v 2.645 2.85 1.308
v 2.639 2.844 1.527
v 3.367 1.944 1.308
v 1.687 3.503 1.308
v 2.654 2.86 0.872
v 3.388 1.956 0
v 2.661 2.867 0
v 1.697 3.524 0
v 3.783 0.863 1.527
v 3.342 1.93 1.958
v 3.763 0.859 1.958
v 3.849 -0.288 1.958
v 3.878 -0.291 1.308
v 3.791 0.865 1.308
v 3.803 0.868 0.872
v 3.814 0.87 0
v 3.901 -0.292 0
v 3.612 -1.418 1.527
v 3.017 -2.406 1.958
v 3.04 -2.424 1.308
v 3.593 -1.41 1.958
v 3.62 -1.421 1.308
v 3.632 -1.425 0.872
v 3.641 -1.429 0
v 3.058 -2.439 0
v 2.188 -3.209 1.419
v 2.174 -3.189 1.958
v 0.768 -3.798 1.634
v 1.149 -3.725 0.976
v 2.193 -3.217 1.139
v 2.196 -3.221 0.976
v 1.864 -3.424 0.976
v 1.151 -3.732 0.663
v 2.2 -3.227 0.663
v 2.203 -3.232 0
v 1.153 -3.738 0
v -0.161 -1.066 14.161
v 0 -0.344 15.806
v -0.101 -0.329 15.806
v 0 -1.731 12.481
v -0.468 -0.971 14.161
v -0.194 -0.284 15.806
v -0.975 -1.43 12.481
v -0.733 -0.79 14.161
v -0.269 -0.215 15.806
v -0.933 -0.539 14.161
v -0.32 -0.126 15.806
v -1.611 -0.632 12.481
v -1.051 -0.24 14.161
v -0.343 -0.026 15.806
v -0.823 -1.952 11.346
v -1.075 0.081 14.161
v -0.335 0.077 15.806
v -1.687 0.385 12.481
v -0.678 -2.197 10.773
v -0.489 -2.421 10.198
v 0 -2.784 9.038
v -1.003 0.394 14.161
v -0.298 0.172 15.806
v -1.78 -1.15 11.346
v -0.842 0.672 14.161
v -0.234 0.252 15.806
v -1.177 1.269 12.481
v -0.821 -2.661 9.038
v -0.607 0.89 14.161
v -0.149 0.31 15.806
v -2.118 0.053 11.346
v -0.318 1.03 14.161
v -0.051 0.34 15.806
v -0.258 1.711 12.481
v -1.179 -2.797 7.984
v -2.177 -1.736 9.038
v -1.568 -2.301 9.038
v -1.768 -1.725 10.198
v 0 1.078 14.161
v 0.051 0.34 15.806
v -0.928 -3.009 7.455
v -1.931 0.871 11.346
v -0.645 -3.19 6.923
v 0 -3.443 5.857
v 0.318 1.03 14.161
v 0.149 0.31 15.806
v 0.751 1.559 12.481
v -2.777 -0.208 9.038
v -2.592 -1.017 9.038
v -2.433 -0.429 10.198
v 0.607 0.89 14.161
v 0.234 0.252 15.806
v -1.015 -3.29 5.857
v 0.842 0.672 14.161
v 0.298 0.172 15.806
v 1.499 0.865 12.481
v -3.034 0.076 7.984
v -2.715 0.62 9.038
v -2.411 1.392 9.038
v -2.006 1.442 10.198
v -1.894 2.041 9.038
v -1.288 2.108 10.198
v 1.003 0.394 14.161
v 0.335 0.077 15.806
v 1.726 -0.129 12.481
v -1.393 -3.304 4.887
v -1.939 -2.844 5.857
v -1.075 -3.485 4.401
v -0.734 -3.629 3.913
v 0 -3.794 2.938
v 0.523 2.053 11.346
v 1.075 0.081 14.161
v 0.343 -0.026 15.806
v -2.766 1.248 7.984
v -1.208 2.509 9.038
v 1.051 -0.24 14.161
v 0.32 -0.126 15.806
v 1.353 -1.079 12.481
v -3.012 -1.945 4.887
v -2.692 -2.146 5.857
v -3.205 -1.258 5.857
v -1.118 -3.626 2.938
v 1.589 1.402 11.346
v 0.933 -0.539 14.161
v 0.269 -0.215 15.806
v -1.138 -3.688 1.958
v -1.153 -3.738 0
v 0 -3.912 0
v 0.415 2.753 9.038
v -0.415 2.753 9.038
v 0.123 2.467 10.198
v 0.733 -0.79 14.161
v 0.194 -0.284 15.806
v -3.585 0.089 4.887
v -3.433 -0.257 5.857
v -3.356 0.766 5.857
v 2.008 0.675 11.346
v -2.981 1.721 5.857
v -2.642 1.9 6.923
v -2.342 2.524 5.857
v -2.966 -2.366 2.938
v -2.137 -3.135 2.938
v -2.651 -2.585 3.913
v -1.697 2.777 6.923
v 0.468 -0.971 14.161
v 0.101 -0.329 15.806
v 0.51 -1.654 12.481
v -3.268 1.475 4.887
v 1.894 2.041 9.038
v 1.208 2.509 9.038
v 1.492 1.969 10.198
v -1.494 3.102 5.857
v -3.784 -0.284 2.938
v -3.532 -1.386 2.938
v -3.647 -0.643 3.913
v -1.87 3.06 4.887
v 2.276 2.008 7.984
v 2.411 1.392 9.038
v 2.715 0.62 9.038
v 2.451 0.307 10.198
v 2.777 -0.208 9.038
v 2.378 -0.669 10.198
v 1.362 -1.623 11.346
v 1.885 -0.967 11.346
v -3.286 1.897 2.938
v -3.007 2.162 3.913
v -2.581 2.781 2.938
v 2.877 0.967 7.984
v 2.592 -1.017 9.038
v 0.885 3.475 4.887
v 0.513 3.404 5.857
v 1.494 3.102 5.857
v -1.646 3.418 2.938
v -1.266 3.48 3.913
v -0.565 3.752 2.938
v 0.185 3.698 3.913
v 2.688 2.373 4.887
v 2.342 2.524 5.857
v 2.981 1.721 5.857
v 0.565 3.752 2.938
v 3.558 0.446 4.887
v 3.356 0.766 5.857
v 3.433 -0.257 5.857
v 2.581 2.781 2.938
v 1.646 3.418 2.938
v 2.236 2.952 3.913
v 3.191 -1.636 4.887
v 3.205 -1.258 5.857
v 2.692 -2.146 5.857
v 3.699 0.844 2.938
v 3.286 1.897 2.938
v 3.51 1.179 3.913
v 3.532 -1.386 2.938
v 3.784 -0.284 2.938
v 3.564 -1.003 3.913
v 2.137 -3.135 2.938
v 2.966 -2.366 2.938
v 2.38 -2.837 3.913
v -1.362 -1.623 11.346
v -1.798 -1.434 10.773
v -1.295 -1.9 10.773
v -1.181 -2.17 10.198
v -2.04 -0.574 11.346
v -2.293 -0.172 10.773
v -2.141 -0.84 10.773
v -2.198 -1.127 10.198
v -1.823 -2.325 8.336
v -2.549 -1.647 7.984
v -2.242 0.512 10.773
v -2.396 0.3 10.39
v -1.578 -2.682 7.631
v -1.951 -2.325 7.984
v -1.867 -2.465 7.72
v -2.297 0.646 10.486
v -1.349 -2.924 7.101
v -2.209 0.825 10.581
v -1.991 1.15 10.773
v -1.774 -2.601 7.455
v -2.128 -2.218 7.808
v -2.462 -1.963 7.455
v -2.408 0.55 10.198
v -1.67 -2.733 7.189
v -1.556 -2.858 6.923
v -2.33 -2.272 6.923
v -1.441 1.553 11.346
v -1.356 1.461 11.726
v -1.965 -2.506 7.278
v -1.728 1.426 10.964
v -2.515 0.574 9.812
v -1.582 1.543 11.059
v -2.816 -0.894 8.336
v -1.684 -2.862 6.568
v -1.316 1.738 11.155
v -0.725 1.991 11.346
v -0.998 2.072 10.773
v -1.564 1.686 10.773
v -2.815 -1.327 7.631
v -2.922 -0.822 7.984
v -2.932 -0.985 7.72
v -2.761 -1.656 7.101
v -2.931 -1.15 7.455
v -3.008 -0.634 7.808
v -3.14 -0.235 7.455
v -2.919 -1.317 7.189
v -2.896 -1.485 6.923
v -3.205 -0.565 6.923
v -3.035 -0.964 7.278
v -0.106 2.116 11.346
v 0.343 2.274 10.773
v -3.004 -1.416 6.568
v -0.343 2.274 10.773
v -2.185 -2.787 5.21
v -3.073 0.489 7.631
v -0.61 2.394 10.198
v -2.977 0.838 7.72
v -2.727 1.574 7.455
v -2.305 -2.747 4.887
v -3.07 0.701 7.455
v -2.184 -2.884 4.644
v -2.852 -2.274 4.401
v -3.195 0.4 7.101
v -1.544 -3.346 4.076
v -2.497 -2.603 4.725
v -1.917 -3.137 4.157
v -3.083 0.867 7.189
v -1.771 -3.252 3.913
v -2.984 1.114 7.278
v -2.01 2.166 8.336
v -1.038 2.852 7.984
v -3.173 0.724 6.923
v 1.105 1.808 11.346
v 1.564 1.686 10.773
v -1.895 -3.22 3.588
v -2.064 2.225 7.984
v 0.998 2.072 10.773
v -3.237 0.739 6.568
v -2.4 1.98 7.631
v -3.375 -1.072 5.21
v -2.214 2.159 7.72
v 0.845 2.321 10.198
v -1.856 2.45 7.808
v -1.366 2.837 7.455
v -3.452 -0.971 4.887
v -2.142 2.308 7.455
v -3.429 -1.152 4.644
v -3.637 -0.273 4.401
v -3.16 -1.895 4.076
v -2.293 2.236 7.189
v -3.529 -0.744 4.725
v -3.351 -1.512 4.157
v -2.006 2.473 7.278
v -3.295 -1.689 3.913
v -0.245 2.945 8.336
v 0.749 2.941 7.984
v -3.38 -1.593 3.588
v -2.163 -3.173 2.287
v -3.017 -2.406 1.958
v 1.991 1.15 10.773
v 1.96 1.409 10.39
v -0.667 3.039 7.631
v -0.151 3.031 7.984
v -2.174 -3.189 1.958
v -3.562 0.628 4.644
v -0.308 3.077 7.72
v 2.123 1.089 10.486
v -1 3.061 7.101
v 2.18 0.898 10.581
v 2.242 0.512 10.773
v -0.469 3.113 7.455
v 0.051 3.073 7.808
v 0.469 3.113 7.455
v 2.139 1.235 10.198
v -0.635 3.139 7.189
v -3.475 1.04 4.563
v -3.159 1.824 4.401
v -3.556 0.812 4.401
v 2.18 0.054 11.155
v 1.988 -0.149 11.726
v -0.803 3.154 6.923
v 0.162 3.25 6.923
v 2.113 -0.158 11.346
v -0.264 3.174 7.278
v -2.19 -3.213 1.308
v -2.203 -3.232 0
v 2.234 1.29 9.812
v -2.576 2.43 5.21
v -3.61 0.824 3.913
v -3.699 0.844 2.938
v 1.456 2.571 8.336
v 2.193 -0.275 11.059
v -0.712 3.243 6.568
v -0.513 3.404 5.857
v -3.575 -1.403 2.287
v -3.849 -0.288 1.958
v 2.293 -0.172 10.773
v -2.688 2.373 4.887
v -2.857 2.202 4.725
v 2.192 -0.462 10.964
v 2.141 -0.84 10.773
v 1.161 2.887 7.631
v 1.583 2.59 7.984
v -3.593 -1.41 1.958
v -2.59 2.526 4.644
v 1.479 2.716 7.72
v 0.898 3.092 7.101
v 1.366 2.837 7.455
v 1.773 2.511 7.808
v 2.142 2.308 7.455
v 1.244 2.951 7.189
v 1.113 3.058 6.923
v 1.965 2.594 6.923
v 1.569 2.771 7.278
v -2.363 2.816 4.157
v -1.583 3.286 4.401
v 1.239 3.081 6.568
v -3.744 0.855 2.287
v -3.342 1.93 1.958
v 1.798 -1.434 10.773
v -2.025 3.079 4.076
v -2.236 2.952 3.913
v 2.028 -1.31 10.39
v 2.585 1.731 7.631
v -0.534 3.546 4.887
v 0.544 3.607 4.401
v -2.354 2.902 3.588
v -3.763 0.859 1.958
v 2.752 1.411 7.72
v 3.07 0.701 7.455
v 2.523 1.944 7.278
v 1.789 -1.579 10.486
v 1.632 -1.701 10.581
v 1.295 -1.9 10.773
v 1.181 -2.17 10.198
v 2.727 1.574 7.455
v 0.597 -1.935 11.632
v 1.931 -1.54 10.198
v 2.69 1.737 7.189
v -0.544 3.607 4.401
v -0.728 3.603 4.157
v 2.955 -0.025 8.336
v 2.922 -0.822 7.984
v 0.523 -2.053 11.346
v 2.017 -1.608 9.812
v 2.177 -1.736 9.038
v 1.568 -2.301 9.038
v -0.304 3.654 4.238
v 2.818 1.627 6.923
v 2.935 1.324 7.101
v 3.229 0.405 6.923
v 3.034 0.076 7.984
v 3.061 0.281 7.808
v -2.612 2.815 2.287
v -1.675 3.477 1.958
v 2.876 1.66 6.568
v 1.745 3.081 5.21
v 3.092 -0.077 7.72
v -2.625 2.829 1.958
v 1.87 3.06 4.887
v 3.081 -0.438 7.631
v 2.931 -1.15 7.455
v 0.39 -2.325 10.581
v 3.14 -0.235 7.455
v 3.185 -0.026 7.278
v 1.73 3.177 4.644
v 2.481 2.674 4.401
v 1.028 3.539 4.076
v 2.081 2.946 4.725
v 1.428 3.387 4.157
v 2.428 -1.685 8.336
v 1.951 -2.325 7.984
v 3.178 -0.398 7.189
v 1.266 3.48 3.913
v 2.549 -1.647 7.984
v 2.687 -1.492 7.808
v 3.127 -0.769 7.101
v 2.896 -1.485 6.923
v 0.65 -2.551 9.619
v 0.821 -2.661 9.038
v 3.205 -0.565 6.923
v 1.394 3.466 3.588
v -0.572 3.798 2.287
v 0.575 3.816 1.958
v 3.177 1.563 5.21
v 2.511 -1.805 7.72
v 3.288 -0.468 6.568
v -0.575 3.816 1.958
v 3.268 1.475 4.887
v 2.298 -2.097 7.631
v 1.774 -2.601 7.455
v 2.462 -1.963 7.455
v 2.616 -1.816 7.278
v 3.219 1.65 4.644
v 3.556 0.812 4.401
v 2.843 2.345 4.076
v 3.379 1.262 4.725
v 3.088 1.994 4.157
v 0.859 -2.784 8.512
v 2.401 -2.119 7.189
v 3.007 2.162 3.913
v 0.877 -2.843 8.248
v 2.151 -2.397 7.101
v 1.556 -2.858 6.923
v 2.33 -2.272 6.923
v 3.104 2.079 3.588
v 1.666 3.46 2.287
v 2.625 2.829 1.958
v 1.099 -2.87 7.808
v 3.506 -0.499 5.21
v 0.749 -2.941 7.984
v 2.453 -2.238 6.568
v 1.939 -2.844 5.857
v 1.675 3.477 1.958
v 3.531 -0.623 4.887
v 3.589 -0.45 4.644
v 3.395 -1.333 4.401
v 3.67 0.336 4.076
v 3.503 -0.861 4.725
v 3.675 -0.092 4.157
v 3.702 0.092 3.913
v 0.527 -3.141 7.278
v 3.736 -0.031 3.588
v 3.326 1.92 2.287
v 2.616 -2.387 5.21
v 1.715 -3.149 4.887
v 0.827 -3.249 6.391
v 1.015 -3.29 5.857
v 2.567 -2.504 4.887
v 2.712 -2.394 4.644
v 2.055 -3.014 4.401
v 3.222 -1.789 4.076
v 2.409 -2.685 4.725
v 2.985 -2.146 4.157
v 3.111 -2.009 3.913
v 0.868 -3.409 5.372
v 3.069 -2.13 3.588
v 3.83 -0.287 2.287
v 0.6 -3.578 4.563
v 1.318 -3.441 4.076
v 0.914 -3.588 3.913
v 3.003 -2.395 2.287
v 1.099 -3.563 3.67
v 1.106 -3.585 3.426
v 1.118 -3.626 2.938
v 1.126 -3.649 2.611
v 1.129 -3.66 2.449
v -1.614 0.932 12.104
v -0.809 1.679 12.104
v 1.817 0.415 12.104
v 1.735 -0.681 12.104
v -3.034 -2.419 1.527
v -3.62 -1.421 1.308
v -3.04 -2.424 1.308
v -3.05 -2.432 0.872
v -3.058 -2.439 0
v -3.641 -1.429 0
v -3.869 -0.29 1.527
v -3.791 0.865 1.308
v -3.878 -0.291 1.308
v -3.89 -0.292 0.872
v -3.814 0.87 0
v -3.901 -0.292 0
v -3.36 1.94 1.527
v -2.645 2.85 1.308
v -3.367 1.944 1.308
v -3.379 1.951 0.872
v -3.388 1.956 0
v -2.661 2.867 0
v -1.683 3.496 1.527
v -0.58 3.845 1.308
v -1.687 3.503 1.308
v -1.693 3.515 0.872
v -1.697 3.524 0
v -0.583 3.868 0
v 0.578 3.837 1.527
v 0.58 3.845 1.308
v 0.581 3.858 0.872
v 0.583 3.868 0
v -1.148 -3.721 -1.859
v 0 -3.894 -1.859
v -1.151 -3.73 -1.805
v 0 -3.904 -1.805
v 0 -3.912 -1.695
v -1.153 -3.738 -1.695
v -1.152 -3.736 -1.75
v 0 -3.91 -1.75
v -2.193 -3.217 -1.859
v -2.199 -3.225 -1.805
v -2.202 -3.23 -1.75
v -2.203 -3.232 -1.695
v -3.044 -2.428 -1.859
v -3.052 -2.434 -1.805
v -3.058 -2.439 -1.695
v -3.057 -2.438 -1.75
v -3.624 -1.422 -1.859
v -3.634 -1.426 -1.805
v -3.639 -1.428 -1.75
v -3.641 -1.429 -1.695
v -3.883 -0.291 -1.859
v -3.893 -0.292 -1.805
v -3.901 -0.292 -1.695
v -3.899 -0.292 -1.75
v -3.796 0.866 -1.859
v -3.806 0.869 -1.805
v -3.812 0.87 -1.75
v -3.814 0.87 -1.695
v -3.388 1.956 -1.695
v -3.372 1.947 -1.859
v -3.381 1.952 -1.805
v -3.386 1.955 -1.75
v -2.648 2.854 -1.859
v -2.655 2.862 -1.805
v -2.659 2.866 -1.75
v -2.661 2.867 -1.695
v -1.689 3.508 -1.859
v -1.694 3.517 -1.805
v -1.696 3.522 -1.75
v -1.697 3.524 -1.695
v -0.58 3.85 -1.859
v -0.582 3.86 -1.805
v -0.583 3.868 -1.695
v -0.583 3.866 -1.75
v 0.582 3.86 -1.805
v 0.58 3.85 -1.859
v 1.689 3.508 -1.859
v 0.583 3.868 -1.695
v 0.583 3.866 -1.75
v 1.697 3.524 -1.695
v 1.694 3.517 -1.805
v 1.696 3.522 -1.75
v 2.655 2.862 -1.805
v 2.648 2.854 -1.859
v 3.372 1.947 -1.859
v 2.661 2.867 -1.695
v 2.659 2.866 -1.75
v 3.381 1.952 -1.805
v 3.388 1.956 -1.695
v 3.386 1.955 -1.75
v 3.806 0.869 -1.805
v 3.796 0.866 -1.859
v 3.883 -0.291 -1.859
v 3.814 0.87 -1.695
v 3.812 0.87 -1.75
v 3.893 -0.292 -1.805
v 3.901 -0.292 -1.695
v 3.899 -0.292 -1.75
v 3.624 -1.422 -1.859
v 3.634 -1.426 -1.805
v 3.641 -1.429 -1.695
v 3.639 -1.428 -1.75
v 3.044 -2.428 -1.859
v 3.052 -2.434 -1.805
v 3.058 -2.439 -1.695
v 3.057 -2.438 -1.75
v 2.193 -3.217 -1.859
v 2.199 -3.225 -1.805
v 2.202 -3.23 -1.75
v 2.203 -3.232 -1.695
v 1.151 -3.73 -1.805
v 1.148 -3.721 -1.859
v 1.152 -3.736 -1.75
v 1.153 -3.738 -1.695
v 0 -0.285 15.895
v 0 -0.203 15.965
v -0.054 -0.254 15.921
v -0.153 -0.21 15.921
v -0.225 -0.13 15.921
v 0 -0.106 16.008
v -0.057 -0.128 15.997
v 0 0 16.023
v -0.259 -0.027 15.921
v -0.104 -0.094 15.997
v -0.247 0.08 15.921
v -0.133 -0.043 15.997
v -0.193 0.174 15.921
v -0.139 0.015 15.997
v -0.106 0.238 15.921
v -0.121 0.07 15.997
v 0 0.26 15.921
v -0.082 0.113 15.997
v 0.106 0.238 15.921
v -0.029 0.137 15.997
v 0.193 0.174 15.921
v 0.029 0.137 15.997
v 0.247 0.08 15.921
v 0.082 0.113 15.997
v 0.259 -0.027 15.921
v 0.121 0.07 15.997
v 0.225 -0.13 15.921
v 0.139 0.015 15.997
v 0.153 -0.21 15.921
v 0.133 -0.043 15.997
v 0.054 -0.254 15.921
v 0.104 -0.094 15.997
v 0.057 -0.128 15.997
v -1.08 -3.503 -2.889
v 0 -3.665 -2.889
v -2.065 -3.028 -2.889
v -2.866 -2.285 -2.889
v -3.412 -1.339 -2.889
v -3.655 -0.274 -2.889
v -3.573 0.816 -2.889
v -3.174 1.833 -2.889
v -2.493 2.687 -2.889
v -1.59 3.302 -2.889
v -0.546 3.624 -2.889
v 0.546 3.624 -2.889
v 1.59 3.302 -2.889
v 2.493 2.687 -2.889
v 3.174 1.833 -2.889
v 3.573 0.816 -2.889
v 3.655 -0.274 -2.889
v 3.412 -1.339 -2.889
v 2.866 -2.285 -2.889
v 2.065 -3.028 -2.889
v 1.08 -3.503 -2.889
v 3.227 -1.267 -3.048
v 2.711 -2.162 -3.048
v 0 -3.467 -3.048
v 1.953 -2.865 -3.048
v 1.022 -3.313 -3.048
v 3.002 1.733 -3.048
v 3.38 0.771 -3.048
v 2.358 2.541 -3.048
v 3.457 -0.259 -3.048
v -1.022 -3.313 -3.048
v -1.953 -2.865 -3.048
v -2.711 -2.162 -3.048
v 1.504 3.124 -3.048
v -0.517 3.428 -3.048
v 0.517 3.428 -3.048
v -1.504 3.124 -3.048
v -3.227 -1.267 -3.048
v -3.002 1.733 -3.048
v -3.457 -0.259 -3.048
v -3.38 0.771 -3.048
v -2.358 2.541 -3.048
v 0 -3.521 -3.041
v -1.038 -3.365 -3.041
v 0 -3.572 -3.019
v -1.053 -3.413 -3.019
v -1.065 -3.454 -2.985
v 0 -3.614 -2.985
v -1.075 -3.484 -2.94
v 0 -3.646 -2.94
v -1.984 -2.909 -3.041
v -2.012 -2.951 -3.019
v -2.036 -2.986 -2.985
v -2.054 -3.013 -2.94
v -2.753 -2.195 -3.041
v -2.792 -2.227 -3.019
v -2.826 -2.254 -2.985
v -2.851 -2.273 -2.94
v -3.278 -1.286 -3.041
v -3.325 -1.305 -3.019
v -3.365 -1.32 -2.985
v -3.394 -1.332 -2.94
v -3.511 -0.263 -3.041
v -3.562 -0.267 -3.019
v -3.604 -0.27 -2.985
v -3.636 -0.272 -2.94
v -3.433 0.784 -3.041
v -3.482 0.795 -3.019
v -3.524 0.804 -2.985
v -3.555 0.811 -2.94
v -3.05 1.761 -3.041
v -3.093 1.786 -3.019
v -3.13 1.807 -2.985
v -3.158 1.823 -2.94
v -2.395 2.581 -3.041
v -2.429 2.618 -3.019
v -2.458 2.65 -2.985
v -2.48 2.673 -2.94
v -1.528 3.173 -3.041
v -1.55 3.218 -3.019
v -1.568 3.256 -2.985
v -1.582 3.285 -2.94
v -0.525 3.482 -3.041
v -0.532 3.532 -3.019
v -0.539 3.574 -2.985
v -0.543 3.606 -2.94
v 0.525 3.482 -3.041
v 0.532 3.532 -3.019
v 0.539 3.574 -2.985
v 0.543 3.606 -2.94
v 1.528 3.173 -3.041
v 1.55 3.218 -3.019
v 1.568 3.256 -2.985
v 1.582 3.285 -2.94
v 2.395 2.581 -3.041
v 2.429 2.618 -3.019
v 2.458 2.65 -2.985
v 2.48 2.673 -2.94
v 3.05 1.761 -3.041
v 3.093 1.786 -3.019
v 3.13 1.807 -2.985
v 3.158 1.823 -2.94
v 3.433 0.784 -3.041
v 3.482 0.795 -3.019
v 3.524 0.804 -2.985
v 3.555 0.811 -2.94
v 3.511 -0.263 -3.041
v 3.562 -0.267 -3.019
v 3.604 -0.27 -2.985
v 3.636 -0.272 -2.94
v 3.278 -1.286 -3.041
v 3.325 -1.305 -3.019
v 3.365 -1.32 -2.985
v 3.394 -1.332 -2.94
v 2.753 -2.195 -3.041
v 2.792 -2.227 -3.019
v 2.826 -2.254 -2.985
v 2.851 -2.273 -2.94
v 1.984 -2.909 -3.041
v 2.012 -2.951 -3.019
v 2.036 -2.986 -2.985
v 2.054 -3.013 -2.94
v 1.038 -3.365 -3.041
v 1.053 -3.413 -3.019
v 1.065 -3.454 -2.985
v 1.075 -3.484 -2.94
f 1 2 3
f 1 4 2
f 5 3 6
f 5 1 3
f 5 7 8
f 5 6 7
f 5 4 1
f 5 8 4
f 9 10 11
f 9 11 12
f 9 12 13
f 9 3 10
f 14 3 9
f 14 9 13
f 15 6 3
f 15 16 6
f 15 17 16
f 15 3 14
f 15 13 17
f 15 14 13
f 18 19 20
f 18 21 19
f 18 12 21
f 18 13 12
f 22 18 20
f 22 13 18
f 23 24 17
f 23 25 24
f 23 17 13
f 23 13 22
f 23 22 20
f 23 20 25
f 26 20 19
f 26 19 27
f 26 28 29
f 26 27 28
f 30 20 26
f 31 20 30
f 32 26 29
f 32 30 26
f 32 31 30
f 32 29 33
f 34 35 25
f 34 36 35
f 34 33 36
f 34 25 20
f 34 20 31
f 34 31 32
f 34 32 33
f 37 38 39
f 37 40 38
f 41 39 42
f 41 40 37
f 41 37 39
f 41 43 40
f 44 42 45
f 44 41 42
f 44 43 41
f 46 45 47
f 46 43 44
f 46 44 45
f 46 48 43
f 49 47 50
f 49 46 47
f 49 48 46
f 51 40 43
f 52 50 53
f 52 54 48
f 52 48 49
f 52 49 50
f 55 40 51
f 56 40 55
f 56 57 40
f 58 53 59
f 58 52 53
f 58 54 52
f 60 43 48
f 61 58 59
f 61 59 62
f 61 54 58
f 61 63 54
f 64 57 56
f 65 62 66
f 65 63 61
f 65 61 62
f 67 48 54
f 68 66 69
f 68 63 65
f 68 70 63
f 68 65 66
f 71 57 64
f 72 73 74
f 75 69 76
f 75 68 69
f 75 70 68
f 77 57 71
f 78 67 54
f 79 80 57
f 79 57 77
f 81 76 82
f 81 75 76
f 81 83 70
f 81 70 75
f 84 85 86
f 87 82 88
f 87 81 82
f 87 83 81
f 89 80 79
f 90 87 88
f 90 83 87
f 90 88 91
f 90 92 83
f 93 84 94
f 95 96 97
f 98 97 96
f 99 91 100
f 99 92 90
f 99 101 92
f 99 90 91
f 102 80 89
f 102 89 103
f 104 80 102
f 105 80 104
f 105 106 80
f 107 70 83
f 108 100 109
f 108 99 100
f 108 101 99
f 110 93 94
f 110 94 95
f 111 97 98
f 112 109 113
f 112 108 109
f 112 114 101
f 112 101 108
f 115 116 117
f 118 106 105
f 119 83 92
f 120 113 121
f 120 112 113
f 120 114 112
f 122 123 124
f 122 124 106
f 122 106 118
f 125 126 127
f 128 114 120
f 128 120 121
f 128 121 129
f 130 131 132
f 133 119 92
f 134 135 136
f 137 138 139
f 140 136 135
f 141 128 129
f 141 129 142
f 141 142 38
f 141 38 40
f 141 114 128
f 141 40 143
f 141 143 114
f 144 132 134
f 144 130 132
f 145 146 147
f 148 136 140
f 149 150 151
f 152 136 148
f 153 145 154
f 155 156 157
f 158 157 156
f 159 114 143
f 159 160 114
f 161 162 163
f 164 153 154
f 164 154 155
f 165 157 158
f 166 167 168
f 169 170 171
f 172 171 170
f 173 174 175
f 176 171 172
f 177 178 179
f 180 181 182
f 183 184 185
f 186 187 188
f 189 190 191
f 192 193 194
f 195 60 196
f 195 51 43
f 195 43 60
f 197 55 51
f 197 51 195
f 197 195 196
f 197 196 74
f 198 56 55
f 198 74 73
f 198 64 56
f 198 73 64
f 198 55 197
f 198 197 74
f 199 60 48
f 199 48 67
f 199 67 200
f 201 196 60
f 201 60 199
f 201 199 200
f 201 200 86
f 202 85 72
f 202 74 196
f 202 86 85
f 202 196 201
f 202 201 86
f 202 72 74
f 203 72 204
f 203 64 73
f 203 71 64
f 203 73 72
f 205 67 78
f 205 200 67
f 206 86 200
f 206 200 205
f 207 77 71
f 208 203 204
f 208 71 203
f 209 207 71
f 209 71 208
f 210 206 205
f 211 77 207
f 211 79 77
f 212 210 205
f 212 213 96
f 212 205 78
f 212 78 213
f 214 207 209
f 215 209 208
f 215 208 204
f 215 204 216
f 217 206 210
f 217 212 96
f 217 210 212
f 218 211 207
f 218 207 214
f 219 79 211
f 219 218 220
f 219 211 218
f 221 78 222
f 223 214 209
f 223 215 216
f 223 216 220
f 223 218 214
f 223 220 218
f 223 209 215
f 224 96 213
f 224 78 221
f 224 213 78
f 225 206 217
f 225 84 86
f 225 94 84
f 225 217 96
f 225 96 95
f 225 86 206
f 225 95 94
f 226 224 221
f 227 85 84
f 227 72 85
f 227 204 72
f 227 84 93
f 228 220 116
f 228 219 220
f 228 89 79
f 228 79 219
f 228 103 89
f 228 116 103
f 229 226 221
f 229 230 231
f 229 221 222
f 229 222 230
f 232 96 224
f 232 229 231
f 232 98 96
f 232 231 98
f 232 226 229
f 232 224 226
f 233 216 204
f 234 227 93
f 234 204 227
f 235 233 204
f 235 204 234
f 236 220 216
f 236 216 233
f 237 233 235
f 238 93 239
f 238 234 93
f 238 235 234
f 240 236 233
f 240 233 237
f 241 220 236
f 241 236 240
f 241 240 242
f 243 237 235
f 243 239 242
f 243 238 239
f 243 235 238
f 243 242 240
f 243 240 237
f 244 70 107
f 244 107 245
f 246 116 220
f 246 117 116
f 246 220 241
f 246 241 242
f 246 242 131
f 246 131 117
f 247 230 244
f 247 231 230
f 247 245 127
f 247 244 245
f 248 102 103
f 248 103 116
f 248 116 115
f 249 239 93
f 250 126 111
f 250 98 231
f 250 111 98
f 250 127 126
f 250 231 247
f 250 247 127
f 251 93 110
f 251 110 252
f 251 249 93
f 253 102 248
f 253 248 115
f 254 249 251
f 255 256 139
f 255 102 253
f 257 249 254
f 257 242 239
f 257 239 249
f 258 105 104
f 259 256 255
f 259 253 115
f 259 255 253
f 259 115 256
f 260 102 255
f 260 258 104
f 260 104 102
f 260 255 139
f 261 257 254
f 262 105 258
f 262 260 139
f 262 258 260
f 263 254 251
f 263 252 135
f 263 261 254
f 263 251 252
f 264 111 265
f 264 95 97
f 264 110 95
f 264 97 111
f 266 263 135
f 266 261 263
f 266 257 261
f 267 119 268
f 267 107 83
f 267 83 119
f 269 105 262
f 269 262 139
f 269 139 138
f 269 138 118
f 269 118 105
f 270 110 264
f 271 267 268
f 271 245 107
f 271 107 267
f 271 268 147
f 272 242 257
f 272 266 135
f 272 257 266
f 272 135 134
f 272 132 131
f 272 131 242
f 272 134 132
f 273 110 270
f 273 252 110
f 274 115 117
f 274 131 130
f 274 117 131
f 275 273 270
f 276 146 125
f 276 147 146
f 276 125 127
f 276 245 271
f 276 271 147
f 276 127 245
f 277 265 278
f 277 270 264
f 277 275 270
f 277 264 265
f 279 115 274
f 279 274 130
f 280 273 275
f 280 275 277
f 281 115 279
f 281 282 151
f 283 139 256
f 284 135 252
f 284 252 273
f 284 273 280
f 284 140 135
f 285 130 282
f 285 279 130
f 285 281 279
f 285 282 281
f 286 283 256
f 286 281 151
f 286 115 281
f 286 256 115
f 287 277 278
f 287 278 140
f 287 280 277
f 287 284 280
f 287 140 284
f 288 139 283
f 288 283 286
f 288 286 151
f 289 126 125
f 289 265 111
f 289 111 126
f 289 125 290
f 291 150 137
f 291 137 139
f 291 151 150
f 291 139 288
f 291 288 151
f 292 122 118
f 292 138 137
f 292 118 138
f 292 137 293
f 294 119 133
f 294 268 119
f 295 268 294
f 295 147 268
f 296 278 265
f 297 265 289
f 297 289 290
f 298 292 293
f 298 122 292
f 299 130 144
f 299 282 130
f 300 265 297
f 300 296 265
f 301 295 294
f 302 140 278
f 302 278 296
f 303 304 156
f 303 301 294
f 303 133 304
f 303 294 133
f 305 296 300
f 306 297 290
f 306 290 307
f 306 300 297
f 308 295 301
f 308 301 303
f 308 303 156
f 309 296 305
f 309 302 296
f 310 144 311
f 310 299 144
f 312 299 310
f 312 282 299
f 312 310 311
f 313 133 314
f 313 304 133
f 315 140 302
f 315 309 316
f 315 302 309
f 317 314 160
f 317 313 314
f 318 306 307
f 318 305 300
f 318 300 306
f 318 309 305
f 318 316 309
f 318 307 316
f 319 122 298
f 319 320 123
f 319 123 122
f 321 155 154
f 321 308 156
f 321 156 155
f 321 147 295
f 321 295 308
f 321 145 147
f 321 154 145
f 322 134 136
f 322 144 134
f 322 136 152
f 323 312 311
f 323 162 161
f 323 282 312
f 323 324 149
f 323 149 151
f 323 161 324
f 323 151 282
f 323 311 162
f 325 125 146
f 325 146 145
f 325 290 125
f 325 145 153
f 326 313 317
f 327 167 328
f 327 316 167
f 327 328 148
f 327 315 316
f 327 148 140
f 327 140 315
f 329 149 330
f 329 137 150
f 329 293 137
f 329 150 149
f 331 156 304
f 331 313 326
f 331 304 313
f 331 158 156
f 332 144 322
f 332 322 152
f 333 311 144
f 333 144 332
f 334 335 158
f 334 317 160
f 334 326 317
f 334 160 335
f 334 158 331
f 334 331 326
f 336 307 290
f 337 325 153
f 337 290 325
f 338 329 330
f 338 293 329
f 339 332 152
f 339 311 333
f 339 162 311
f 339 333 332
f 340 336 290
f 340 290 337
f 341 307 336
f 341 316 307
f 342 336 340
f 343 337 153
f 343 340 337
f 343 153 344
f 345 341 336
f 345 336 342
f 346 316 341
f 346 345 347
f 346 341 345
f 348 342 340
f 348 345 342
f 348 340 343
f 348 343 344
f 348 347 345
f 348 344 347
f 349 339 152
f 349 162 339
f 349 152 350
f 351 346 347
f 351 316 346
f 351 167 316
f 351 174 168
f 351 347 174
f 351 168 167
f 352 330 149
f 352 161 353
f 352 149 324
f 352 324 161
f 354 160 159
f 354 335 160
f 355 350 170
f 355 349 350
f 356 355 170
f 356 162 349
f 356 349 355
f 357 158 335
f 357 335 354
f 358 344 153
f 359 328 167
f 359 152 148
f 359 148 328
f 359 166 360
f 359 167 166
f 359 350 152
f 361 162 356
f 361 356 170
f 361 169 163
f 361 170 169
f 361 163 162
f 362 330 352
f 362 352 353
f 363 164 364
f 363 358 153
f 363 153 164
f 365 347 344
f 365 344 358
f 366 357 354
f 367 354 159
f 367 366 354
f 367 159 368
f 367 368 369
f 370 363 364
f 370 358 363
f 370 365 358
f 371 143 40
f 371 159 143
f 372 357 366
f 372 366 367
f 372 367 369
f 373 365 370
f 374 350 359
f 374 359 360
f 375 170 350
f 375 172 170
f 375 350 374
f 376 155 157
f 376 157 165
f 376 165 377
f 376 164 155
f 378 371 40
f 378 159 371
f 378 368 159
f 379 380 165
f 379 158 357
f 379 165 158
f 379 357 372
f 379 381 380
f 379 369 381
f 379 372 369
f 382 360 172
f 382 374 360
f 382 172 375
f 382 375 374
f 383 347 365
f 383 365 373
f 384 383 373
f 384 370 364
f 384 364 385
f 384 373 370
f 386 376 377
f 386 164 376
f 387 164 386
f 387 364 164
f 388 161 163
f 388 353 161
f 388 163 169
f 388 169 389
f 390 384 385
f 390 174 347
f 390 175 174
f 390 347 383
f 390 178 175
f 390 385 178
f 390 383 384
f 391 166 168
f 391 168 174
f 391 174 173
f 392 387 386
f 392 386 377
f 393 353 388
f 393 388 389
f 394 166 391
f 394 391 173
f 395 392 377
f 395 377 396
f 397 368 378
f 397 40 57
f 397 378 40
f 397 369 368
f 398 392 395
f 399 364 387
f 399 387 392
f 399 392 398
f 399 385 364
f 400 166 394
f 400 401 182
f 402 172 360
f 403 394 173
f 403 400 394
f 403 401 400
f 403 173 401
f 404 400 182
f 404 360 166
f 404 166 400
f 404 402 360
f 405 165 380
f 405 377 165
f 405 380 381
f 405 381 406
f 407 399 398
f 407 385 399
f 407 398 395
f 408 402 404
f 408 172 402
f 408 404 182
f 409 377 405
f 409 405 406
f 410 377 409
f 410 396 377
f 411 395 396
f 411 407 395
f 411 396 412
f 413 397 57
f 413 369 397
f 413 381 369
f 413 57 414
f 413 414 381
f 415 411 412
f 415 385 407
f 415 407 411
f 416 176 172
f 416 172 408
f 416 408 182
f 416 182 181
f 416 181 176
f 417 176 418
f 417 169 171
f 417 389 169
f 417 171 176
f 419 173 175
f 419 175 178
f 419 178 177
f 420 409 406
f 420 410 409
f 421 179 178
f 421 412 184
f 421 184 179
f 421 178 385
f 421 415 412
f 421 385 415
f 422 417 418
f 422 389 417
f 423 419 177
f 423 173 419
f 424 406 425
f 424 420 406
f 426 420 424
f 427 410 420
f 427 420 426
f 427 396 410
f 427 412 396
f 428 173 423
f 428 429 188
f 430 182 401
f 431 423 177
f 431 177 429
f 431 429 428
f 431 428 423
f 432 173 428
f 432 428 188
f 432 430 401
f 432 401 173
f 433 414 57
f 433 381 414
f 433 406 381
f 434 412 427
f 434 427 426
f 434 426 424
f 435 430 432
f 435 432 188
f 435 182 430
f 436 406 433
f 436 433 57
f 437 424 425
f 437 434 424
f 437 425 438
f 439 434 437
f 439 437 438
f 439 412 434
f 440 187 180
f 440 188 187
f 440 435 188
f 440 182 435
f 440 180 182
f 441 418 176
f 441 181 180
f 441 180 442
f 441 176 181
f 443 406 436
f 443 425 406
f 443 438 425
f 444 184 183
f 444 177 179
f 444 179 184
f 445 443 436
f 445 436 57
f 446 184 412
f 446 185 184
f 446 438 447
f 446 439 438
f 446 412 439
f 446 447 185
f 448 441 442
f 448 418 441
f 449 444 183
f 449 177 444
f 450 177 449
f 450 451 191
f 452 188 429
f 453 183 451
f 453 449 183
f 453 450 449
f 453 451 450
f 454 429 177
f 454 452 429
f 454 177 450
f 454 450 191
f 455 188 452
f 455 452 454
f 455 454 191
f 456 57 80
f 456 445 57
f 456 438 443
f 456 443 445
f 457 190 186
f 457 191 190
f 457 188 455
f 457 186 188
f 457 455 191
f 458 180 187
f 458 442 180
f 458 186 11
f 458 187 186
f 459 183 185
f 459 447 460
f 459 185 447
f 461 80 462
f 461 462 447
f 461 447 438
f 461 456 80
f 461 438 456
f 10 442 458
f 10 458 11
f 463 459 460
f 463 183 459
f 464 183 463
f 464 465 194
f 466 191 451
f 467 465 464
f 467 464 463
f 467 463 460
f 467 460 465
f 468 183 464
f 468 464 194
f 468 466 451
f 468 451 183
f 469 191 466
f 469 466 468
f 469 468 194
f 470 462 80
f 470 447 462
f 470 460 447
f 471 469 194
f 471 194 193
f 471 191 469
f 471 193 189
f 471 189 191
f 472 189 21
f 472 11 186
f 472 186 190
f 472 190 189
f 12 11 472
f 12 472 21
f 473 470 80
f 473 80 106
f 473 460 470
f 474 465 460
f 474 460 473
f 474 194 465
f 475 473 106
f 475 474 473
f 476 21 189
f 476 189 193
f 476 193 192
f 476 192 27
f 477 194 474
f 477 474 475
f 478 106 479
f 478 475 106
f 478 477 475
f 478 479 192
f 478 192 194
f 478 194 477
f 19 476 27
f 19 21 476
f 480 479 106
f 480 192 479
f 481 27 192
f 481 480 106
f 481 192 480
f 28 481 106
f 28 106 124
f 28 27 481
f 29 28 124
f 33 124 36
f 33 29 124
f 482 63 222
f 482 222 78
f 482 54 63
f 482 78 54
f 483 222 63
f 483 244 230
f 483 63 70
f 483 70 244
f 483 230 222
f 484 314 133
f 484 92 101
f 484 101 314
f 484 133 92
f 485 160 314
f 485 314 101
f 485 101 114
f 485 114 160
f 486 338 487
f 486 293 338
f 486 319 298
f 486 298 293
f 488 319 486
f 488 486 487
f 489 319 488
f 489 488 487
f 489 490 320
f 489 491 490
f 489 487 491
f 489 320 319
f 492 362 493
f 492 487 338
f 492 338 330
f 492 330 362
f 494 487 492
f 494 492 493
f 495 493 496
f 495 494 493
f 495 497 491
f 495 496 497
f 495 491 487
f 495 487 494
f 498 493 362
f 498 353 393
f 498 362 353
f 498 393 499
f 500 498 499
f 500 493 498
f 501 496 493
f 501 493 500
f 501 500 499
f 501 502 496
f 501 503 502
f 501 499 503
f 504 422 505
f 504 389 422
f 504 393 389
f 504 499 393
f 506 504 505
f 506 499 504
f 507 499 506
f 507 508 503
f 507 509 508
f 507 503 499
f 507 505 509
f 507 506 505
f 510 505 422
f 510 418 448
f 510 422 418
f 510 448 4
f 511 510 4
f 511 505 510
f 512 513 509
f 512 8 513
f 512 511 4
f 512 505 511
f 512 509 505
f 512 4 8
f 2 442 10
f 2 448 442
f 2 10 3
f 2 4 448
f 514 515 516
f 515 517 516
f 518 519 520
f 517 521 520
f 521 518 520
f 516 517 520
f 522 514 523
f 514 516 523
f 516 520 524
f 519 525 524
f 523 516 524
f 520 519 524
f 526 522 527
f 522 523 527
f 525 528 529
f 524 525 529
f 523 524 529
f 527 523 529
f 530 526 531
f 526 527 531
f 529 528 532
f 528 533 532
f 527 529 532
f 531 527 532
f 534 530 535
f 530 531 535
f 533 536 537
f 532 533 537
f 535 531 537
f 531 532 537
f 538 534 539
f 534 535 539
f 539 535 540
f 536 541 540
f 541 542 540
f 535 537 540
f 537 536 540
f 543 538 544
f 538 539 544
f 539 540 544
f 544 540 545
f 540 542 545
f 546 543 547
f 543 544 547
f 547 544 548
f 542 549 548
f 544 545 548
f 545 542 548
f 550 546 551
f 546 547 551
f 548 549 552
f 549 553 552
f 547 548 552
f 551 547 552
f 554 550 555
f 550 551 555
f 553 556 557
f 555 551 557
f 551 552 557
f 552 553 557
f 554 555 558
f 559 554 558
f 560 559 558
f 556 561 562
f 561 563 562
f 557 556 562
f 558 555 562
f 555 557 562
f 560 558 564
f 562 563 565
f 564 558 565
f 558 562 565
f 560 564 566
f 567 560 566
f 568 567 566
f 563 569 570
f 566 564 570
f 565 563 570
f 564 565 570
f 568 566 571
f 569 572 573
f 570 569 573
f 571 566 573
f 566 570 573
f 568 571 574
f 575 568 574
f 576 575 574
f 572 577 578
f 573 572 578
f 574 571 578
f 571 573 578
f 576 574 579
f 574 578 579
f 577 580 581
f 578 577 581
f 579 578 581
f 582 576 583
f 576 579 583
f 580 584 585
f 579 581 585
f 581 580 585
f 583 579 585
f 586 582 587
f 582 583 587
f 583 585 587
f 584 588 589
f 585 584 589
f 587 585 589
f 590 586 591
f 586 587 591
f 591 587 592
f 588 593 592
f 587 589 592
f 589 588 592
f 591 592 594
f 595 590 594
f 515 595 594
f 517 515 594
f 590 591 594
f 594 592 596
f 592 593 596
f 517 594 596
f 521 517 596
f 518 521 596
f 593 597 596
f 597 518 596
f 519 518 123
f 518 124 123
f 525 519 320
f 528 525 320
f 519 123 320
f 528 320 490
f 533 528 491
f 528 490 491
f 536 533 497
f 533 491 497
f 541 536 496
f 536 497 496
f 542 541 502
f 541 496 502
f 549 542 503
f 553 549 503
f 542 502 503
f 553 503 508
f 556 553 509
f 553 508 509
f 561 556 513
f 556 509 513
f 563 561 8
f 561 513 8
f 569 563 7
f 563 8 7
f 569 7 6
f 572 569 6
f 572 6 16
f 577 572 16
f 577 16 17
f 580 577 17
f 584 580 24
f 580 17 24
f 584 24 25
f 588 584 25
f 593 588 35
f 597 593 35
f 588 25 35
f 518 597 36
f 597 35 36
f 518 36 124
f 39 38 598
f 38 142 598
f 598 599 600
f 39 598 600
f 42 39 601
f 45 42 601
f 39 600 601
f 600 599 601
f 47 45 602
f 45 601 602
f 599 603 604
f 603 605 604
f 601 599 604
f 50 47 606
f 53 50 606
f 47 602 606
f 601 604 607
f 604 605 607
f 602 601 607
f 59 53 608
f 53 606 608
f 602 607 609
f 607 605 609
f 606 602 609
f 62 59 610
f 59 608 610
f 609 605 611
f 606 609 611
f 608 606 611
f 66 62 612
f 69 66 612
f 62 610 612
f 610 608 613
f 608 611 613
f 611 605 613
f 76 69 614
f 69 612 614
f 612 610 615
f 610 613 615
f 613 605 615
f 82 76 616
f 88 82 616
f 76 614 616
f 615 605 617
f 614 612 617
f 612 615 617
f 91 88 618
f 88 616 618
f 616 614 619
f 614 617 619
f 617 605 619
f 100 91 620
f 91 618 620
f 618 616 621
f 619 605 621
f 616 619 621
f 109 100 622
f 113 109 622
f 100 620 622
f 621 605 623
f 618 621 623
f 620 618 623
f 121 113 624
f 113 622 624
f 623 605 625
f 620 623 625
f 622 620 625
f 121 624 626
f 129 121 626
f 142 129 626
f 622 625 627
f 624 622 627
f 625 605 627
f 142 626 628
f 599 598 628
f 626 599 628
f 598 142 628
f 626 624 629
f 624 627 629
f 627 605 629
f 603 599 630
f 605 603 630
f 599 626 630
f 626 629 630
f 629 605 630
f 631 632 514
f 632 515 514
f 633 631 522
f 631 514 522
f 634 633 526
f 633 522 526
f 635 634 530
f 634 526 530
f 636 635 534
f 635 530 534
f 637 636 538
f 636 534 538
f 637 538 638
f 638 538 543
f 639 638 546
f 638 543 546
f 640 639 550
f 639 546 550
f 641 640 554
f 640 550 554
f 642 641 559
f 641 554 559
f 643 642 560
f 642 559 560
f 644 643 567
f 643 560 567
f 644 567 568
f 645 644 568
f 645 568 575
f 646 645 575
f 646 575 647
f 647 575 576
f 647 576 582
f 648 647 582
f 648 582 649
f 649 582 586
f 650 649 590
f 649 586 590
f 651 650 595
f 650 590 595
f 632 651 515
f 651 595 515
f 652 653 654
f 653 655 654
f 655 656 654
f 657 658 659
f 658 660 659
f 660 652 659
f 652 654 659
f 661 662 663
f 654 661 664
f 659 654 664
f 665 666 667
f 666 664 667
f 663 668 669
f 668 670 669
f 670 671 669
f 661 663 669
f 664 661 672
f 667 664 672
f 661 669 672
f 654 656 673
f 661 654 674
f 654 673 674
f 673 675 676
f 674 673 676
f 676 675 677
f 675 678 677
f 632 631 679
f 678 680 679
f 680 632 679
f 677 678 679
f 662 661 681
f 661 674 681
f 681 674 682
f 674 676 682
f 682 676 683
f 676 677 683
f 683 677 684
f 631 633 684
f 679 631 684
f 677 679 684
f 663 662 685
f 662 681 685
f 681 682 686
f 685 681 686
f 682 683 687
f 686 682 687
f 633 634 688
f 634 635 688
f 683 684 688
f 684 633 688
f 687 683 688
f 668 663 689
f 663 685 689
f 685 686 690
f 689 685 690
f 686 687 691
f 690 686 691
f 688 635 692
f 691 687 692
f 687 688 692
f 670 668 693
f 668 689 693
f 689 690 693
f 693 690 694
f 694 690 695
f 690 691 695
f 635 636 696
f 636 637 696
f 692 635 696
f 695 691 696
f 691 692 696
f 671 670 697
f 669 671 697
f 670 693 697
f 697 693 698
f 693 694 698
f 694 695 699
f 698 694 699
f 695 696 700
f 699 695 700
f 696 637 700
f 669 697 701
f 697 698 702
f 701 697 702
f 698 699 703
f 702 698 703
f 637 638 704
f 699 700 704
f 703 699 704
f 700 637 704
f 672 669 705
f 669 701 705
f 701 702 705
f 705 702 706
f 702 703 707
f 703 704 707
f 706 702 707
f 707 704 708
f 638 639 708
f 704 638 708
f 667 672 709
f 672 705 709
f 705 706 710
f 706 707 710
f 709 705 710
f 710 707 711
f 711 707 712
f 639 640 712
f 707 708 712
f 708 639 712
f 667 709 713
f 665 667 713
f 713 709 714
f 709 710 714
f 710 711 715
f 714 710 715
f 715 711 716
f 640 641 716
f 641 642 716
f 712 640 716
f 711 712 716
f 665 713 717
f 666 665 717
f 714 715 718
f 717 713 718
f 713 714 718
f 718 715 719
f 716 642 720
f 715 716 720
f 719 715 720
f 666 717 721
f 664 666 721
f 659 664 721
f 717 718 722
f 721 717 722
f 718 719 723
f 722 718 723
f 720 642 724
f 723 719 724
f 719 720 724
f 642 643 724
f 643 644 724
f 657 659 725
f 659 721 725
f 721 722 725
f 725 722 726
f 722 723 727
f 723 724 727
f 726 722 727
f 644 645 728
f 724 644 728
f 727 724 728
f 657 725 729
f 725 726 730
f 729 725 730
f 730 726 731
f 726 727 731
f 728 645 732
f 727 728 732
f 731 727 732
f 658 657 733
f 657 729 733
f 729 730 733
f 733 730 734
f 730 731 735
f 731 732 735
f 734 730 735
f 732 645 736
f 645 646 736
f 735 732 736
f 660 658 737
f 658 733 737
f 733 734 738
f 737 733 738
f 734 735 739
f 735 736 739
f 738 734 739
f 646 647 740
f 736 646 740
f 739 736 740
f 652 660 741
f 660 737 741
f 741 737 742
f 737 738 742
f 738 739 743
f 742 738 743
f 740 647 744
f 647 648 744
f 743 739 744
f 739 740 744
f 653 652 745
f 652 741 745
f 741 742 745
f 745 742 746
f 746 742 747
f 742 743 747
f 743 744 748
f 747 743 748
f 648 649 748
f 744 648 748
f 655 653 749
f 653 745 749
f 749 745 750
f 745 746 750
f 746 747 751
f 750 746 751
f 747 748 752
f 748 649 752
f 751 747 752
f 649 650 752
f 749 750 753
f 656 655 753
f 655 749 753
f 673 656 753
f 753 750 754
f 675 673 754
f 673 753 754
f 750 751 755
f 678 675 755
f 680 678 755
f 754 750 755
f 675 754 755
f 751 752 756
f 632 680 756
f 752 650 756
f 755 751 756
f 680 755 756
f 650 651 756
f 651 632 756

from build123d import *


with BuildPart() as part:
    # Sketch2 → Basic (Boat Tail) (revolve)
    with BuildSketch(Plane(origin=(0, 0, 0), x_dir=(0, 0, -1), z_dir=(1, 0, 0)), mode=Mode.PRIVATE) as basic_boat_tail_sk:
        with BuildLine():
            Line((-16.023408116, 0), (0, 0))
            Line((0, 0), (3.048, 0))
            Line((3.048, 0), (3.048, 3.466962537))
            ThreePointArc((3.048, 3.466962537), (3.003272527, 3.594150186), (2.88878053, 3.665345885))
            Line((2.88878053, 3.665345885), (1.859474413, 3.893537557))
            ThreePointArc((1.859474413, 3.893537557), (1.777503986, 3.90707093), (1.694547427, 3.9116))
            Line((1.694547427, 3.9116), (0, 3.9116))
            add(Edge.make_bspline(
                [(-15.806059792, 0.344062682), (-15.732658123, 0.378975815), (-15.5872123, 0.447397482), (-15.149699133, 0.650944906), (-14.681600853, 0.857658133), (-14.014163585, 1.143254029), (-13.316156675, 1.420650834), (-12.573807647, 1.700970995), (-11.848235301, 1.955184147), (-11.103931644, 2.200207389), (-10.362812016, 2.425686256), (-9.612087432, 2.637726581), (-8.860134943, 2.832464436), (-8.10228101, 3.0121039), (-7.342111585, 3.175171021), (-6.577659689, 3.322441704), (-5.811219133, 3.453331565), (-5.041028241, 3.5681016), (-4.270284693, 3.666499153), (-3.591630851, 3.738350546), (-3.012983586, 3.789672425), (-2.523895361, 3.825627048), (-2.143648517, 3.850278035), (-1.740246038, 3.870831388), (-1.377513769, 3.887272733), (-0.94485814, 3.899607712), (-0.630224141, 3.907830552), (-0.243605203, 3.910914664), (-0.081281751, 3.9116), (0, 3.9116)],
                knots=[0.083284636, 0.083284636, 0.083284636, 0.083284636, 0.083284636, 0.103185285, 0.123085934, 0.162887223, 0.202688468, 0.242489745, 0.28229104, 0.322092305, 0.361893565, 0.40169484, 0.441496119, 0.481297382, 0.521098653, 0.560899938, 0.600701203, 0.640502467, 0.680303746, 0.720105021, 0.759906291, 0.779806927, 0.799707563, 0.819608199, 0.839508836, 0.859409472, 0.879310108, 0.899210744, 0.91911138, 0.91911138, 0.91911138, 0.91911138, 0.91911138], degree=4))
            ThreePointArc((-15.806059792, 0.344062682), (-15.964520122, 0.203481831), (-16.023408116, 0))
        make_face()
    revolve(basic_boat_tail_sk.sketch.rotate(Axis((0, 0, 16.023408116), (0, 0, -1)), 180), axis=Axis((0, 0, 16.023408116), (0, 0, -1)))


solid = part.part
